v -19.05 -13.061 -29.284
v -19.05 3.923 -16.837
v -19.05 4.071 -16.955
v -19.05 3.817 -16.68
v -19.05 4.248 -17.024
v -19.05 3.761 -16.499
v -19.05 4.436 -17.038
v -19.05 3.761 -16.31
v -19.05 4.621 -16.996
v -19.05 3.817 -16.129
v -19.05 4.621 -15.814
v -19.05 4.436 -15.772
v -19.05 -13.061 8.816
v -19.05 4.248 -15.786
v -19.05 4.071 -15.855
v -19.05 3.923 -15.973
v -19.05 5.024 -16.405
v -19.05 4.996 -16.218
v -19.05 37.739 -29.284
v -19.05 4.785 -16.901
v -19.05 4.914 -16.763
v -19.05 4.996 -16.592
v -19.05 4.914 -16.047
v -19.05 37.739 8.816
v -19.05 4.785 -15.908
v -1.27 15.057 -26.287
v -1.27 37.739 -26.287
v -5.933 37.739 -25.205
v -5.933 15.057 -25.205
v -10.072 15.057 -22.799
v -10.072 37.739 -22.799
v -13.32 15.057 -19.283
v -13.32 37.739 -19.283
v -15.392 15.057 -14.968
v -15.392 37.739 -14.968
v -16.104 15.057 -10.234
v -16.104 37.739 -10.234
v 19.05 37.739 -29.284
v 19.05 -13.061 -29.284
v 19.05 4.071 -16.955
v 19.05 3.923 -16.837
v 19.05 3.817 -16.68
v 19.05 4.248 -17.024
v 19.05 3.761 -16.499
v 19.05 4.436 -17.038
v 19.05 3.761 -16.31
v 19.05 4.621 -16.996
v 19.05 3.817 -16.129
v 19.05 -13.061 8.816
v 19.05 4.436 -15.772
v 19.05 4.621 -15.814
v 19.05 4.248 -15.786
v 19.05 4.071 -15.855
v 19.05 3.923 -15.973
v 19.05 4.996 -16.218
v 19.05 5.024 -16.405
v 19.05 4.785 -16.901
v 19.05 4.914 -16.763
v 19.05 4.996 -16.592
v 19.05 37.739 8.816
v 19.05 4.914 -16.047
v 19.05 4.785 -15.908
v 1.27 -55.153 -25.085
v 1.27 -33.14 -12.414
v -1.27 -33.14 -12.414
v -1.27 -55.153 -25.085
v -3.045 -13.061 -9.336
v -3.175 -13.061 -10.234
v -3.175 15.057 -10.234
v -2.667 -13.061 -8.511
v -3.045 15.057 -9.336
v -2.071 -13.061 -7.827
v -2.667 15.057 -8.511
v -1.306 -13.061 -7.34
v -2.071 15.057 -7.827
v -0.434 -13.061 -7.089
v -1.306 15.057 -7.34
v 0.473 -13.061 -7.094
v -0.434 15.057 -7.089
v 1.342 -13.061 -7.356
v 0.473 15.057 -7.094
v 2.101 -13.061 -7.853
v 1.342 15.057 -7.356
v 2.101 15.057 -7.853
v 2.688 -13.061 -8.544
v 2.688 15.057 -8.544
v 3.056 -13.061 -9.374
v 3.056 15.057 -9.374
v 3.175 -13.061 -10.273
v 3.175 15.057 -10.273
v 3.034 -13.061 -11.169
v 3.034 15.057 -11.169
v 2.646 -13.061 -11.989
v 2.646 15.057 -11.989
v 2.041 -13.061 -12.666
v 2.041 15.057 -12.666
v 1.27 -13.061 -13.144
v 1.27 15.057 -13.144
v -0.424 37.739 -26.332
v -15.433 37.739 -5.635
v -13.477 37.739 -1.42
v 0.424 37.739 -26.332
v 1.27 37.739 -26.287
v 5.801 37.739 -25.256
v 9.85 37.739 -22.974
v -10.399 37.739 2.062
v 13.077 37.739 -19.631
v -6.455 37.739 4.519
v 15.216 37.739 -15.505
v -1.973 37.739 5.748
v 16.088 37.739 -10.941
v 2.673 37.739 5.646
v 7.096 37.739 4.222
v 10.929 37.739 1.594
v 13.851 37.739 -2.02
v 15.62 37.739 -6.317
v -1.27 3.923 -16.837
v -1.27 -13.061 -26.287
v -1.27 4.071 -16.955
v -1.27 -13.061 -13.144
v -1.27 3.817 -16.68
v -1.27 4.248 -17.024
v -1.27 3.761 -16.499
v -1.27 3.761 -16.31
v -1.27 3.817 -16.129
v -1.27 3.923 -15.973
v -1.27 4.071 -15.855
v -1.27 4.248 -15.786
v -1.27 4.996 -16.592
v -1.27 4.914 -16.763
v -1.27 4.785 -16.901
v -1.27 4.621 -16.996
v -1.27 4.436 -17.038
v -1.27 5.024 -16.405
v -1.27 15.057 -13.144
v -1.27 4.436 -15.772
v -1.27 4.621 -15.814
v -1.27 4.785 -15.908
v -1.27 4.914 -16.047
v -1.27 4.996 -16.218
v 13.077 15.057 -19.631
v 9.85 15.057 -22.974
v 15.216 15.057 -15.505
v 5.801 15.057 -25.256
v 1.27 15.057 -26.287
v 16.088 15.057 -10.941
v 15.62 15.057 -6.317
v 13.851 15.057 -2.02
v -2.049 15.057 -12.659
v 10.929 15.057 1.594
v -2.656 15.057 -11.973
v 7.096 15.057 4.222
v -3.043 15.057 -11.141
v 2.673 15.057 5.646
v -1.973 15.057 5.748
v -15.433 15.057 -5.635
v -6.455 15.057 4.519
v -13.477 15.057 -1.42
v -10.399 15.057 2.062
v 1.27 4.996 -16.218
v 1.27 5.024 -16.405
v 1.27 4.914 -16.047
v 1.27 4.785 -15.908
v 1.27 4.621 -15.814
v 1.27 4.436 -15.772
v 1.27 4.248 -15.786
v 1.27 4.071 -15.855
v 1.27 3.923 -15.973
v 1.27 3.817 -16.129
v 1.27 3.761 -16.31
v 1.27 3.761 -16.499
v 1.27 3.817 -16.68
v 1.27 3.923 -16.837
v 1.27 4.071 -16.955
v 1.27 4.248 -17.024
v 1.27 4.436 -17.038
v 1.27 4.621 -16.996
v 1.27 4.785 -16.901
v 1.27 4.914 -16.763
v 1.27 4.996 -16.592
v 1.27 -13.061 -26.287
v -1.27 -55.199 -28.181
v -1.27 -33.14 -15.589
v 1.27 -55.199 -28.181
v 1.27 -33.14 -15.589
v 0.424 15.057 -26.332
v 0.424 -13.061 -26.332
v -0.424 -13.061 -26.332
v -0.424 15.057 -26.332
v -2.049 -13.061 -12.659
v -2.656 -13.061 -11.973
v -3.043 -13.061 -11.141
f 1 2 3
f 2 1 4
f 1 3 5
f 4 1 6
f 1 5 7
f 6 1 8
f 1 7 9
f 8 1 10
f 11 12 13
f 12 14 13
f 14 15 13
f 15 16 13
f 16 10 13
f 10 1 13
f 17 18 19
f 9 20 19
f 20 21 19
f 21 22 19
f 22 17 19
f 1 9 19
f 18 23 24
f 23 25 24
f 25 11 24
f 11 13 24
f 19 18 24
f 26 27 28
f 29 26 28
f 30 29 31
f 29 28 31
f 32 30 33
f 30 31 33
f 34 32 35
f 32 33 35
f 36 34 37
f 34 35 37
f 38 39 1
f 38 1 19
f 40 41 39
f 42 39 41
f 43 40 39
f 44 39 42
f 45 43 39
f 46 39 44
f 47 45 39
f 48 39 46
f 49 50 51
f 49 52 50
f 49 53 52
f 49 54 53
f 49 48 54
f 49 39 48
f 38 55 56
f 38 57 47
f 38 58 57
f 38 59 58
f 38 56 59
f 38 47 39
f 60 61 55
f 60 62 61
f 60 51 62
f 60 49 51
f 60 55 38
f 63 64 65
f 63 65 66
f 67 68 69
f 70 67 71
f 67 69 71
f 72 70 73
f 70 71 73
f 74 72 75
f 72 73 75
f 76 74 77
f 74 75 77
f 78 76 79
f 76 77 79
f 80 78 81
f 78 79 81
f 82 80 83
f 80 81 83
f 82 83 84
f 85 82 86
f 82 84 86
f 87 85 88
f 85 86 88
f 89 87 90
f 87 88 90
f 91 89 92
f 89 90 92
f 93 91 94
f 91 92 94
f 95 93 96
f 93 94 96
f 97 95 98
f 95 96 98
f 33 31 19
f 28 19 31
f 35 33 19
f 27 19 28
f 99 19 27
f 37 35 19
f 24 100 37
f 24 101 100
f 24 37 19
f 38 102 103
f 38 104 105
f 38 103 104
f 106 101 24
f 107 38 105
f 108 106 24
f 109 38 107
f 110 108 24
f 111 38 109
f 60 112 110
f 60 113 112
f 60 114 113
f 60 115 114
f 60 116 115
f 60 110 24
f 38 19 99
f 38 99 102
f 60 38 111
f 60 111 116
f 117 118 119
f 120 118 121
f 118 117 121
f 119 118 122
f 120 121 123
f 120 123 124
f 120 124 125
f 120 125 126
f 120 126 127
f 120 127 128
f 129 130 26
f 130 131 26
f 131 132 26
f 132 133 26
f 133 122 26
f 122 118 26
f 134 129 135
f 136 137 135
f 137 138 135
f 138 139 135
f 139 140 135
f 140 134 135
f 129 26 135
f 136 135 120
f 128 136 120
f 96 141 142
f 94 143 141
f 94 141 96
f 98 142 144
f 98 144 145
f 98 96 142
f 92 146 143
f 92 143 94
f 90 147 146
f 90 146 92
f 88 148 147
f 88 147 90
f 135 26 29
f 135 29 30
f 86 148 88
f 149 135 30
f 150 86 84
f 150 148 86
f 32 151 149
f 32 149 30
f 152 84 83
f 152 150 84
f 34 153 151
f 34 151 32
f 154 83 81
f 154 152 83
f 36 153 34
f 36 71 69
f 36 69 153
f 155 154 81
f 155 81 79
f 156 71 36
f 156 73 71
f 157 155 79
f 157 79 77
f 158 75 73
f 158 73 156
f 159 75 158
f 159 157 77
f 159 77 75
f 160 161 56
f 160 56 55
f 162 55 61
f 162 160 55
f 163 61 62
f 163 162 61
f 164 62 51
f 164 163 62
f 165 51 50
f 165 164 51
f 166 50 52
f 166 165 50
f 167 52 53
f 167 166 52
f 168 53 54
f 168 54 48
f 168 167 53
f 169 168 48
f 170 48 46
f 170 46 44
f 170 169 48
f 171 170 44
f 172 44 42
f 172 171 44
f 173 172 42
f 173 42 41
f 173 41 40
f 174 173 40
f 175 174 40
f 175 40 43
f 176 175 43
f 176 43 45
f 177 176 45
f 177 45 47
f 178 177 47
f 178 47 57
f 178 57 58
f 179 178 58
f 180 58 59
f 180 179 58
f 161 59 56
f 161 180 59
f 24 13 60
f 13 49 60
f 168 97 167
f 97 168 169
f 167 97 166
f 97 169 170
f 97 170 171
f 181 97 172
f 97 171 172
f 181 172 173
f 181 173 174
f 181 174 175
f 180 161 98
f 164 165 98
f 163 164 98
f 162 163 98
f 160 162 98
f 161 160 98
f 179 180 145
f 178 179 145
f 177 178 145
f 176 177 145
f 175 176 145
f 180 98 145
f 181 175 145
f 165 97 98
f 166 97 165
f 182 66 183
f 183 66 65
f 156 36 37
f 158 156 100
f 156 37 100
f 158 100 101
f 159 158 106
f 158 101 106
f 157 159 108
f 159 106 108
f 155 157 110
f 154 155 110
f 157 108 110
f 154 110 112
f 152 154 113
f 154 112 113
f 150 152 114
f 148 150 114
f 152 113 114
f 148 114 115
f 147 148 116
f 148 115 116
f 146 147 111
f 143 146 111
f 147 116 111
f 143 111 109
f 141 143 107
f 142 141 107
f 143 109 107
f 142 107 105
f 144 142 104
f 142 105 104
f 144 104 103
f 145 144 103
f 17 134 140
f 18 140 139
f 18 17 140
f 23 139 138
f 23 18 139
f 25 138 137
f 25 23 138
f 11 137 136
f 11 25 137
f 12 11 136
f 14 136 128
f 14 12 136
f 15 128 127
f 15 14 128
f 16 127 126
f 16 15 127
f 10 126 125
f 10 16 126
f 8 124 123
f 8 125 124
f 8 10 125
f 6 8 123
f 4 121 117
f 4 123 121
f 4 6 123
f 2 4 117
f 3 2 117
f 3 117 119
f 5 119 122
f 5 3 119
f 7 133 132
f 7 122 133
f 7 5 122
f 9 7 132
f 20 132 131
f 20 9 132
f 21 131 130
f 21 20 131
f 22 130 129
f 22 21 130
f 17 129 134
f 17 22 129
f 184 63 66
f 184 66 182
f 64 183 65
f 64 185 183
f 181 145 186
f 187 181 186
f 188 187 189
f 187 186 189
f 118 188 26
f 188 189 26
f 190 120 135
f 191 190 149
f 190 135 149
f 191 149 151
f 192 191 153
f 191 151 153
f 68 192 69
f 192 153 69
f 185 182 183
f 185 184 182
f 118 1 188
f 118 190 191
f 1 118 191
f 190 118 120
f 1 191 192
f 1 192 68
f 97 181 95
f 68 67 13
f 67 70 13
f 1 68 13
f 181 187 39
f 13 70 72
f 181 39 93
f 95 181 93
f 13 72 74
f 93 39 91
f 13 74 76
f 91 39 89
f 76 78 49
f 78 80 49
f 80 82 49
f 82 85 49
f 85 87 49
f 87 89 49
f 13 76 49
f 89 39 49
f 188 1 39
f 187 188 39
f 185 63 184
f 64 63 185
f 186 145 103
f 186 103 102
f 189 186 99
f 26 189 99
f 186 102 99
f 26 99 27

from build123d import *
from build123d import SkipClean  # not in build123d's __all__

# Parameters (mm, degrees)
F0_W      = 50.8
F0_H      = 38.1
F0_R      = 0.635
F1_DEPTH  = 19.05
F3_DEPTH  = 22.6822
F3_FACE_R = 3.175
F4_DEPTH  = 50.801
F5_DEPTH  = 1.27


with BuildPart() as f1:
    # F0 (on Right) → F1 (new body, symmetric)
    with BuildSketch(Plane.YZ):
        with Locations((12.3391804014, -10.2338362485)):
            Rectangle(F0_W, F0_H)
        with Locations((4.3889804014, -16.404817152)):
            Circle(F0_R, mode=Mode.SUBTRACT)
    extrude(amount=F1_DEPTH, both=True)

    # F2 (on face) → F3 (cut)
    with BuildSketch(Plane(origin=(0, 37.7391804014, 0), x_dir=(-1, 0, 0), z_dir=(0, 1, 0))):
        with BuildLine():
            Line((-1.27, -13.1437718148), (-1.27, -26.2872792736))
            ThreePointArc((-1.27, -26.2872792736), (0, -26.3374362485), (1.27, -26.2872792736))
            Line((1.27, -26.2872792736), (1.27, -13.1437718148))
            ThreePointArc((1.27, -13.1437718148), (0, -13.4088362485), (-1.27, -13.1437718148))
        make_face()
        with BuildLine():
            ThreePointArc((1.27, -26.2872792736), (11.8274575662, -21.1625681274), (16.1036, -10.2338362485))
            ThreePointArc((16.1036, -10.2338362485), (-10.9287318789, 1.5936213177), (-1.27, -26.2872792736))
            Line((-1.27, -26.2872792736), (-1.27, -13.1437718148))
            ThreePointArc((-1.27, -13.1437718148), (-1.7390191201, -7.5774406643), (3.175, -10.2338362485))
            ThreePointArc((3.175, -10.2338362485), (2.6563955842, -11.9728553686), (1.27, -13.1437718148))
            Line((1.27, -13.1437718148), (1.27, -26.2872792736))
        make_face()
    extrude(amount=-F3_DEPTH, mode=Mode.SUBTRACT)

    # F3_face (on face) + F2 (on face) → F4 (cut, through all)
    with BuildSketch(Plane(origin=(0, 37.7391804014, -10.2338362485), x_dir=(-1, 0, 0), z_dir=(0, 1, 0))):
        Circle(F3_FACE_R)
    with BuildSketch(Plane(origin=(0, 37.7391804014, 0), x_dir=(-1, 0, 0), z_dir=(0, 1, 0))):
        with BuildLine():
            Line((-1.27, -13.1437718148), (-1.27, -26.2872792736))
            ThreePointArc((-1.27, -26.2872792736), (0, -26.3374362485), (1.27, -26.2872792736))
            Line((1.27, -26.2872792736), (1.27, -13.1437718148))
            ThreePointArc((1.27, -13.1437718148), (0, -13.4088362485), (-1.27, -13.1437718148))
        make_face()
    with SkipClean():  # cleaning this boolean's faces spoils the solid; the shape is the same uncleaned
        extrude(amount=-F4_DEPTH, mode=Mode.SUBTRACT)


with BuildPart() as f5:
    # F0 (on Right) → F5 (new body, symmetric)
    with BuildSketch(Plane.YZ):
        Polygon((-33.1396368386, -15.5886525063), (-33.1396368386, -12.4136525063), (-55.153152075, -25.0850828493), (-55.1986047759, -28.1807902733), align=None)
    extrude(amount=F5_DEPTH, both=True)


solid = Compound([f1.part, f5.part])
